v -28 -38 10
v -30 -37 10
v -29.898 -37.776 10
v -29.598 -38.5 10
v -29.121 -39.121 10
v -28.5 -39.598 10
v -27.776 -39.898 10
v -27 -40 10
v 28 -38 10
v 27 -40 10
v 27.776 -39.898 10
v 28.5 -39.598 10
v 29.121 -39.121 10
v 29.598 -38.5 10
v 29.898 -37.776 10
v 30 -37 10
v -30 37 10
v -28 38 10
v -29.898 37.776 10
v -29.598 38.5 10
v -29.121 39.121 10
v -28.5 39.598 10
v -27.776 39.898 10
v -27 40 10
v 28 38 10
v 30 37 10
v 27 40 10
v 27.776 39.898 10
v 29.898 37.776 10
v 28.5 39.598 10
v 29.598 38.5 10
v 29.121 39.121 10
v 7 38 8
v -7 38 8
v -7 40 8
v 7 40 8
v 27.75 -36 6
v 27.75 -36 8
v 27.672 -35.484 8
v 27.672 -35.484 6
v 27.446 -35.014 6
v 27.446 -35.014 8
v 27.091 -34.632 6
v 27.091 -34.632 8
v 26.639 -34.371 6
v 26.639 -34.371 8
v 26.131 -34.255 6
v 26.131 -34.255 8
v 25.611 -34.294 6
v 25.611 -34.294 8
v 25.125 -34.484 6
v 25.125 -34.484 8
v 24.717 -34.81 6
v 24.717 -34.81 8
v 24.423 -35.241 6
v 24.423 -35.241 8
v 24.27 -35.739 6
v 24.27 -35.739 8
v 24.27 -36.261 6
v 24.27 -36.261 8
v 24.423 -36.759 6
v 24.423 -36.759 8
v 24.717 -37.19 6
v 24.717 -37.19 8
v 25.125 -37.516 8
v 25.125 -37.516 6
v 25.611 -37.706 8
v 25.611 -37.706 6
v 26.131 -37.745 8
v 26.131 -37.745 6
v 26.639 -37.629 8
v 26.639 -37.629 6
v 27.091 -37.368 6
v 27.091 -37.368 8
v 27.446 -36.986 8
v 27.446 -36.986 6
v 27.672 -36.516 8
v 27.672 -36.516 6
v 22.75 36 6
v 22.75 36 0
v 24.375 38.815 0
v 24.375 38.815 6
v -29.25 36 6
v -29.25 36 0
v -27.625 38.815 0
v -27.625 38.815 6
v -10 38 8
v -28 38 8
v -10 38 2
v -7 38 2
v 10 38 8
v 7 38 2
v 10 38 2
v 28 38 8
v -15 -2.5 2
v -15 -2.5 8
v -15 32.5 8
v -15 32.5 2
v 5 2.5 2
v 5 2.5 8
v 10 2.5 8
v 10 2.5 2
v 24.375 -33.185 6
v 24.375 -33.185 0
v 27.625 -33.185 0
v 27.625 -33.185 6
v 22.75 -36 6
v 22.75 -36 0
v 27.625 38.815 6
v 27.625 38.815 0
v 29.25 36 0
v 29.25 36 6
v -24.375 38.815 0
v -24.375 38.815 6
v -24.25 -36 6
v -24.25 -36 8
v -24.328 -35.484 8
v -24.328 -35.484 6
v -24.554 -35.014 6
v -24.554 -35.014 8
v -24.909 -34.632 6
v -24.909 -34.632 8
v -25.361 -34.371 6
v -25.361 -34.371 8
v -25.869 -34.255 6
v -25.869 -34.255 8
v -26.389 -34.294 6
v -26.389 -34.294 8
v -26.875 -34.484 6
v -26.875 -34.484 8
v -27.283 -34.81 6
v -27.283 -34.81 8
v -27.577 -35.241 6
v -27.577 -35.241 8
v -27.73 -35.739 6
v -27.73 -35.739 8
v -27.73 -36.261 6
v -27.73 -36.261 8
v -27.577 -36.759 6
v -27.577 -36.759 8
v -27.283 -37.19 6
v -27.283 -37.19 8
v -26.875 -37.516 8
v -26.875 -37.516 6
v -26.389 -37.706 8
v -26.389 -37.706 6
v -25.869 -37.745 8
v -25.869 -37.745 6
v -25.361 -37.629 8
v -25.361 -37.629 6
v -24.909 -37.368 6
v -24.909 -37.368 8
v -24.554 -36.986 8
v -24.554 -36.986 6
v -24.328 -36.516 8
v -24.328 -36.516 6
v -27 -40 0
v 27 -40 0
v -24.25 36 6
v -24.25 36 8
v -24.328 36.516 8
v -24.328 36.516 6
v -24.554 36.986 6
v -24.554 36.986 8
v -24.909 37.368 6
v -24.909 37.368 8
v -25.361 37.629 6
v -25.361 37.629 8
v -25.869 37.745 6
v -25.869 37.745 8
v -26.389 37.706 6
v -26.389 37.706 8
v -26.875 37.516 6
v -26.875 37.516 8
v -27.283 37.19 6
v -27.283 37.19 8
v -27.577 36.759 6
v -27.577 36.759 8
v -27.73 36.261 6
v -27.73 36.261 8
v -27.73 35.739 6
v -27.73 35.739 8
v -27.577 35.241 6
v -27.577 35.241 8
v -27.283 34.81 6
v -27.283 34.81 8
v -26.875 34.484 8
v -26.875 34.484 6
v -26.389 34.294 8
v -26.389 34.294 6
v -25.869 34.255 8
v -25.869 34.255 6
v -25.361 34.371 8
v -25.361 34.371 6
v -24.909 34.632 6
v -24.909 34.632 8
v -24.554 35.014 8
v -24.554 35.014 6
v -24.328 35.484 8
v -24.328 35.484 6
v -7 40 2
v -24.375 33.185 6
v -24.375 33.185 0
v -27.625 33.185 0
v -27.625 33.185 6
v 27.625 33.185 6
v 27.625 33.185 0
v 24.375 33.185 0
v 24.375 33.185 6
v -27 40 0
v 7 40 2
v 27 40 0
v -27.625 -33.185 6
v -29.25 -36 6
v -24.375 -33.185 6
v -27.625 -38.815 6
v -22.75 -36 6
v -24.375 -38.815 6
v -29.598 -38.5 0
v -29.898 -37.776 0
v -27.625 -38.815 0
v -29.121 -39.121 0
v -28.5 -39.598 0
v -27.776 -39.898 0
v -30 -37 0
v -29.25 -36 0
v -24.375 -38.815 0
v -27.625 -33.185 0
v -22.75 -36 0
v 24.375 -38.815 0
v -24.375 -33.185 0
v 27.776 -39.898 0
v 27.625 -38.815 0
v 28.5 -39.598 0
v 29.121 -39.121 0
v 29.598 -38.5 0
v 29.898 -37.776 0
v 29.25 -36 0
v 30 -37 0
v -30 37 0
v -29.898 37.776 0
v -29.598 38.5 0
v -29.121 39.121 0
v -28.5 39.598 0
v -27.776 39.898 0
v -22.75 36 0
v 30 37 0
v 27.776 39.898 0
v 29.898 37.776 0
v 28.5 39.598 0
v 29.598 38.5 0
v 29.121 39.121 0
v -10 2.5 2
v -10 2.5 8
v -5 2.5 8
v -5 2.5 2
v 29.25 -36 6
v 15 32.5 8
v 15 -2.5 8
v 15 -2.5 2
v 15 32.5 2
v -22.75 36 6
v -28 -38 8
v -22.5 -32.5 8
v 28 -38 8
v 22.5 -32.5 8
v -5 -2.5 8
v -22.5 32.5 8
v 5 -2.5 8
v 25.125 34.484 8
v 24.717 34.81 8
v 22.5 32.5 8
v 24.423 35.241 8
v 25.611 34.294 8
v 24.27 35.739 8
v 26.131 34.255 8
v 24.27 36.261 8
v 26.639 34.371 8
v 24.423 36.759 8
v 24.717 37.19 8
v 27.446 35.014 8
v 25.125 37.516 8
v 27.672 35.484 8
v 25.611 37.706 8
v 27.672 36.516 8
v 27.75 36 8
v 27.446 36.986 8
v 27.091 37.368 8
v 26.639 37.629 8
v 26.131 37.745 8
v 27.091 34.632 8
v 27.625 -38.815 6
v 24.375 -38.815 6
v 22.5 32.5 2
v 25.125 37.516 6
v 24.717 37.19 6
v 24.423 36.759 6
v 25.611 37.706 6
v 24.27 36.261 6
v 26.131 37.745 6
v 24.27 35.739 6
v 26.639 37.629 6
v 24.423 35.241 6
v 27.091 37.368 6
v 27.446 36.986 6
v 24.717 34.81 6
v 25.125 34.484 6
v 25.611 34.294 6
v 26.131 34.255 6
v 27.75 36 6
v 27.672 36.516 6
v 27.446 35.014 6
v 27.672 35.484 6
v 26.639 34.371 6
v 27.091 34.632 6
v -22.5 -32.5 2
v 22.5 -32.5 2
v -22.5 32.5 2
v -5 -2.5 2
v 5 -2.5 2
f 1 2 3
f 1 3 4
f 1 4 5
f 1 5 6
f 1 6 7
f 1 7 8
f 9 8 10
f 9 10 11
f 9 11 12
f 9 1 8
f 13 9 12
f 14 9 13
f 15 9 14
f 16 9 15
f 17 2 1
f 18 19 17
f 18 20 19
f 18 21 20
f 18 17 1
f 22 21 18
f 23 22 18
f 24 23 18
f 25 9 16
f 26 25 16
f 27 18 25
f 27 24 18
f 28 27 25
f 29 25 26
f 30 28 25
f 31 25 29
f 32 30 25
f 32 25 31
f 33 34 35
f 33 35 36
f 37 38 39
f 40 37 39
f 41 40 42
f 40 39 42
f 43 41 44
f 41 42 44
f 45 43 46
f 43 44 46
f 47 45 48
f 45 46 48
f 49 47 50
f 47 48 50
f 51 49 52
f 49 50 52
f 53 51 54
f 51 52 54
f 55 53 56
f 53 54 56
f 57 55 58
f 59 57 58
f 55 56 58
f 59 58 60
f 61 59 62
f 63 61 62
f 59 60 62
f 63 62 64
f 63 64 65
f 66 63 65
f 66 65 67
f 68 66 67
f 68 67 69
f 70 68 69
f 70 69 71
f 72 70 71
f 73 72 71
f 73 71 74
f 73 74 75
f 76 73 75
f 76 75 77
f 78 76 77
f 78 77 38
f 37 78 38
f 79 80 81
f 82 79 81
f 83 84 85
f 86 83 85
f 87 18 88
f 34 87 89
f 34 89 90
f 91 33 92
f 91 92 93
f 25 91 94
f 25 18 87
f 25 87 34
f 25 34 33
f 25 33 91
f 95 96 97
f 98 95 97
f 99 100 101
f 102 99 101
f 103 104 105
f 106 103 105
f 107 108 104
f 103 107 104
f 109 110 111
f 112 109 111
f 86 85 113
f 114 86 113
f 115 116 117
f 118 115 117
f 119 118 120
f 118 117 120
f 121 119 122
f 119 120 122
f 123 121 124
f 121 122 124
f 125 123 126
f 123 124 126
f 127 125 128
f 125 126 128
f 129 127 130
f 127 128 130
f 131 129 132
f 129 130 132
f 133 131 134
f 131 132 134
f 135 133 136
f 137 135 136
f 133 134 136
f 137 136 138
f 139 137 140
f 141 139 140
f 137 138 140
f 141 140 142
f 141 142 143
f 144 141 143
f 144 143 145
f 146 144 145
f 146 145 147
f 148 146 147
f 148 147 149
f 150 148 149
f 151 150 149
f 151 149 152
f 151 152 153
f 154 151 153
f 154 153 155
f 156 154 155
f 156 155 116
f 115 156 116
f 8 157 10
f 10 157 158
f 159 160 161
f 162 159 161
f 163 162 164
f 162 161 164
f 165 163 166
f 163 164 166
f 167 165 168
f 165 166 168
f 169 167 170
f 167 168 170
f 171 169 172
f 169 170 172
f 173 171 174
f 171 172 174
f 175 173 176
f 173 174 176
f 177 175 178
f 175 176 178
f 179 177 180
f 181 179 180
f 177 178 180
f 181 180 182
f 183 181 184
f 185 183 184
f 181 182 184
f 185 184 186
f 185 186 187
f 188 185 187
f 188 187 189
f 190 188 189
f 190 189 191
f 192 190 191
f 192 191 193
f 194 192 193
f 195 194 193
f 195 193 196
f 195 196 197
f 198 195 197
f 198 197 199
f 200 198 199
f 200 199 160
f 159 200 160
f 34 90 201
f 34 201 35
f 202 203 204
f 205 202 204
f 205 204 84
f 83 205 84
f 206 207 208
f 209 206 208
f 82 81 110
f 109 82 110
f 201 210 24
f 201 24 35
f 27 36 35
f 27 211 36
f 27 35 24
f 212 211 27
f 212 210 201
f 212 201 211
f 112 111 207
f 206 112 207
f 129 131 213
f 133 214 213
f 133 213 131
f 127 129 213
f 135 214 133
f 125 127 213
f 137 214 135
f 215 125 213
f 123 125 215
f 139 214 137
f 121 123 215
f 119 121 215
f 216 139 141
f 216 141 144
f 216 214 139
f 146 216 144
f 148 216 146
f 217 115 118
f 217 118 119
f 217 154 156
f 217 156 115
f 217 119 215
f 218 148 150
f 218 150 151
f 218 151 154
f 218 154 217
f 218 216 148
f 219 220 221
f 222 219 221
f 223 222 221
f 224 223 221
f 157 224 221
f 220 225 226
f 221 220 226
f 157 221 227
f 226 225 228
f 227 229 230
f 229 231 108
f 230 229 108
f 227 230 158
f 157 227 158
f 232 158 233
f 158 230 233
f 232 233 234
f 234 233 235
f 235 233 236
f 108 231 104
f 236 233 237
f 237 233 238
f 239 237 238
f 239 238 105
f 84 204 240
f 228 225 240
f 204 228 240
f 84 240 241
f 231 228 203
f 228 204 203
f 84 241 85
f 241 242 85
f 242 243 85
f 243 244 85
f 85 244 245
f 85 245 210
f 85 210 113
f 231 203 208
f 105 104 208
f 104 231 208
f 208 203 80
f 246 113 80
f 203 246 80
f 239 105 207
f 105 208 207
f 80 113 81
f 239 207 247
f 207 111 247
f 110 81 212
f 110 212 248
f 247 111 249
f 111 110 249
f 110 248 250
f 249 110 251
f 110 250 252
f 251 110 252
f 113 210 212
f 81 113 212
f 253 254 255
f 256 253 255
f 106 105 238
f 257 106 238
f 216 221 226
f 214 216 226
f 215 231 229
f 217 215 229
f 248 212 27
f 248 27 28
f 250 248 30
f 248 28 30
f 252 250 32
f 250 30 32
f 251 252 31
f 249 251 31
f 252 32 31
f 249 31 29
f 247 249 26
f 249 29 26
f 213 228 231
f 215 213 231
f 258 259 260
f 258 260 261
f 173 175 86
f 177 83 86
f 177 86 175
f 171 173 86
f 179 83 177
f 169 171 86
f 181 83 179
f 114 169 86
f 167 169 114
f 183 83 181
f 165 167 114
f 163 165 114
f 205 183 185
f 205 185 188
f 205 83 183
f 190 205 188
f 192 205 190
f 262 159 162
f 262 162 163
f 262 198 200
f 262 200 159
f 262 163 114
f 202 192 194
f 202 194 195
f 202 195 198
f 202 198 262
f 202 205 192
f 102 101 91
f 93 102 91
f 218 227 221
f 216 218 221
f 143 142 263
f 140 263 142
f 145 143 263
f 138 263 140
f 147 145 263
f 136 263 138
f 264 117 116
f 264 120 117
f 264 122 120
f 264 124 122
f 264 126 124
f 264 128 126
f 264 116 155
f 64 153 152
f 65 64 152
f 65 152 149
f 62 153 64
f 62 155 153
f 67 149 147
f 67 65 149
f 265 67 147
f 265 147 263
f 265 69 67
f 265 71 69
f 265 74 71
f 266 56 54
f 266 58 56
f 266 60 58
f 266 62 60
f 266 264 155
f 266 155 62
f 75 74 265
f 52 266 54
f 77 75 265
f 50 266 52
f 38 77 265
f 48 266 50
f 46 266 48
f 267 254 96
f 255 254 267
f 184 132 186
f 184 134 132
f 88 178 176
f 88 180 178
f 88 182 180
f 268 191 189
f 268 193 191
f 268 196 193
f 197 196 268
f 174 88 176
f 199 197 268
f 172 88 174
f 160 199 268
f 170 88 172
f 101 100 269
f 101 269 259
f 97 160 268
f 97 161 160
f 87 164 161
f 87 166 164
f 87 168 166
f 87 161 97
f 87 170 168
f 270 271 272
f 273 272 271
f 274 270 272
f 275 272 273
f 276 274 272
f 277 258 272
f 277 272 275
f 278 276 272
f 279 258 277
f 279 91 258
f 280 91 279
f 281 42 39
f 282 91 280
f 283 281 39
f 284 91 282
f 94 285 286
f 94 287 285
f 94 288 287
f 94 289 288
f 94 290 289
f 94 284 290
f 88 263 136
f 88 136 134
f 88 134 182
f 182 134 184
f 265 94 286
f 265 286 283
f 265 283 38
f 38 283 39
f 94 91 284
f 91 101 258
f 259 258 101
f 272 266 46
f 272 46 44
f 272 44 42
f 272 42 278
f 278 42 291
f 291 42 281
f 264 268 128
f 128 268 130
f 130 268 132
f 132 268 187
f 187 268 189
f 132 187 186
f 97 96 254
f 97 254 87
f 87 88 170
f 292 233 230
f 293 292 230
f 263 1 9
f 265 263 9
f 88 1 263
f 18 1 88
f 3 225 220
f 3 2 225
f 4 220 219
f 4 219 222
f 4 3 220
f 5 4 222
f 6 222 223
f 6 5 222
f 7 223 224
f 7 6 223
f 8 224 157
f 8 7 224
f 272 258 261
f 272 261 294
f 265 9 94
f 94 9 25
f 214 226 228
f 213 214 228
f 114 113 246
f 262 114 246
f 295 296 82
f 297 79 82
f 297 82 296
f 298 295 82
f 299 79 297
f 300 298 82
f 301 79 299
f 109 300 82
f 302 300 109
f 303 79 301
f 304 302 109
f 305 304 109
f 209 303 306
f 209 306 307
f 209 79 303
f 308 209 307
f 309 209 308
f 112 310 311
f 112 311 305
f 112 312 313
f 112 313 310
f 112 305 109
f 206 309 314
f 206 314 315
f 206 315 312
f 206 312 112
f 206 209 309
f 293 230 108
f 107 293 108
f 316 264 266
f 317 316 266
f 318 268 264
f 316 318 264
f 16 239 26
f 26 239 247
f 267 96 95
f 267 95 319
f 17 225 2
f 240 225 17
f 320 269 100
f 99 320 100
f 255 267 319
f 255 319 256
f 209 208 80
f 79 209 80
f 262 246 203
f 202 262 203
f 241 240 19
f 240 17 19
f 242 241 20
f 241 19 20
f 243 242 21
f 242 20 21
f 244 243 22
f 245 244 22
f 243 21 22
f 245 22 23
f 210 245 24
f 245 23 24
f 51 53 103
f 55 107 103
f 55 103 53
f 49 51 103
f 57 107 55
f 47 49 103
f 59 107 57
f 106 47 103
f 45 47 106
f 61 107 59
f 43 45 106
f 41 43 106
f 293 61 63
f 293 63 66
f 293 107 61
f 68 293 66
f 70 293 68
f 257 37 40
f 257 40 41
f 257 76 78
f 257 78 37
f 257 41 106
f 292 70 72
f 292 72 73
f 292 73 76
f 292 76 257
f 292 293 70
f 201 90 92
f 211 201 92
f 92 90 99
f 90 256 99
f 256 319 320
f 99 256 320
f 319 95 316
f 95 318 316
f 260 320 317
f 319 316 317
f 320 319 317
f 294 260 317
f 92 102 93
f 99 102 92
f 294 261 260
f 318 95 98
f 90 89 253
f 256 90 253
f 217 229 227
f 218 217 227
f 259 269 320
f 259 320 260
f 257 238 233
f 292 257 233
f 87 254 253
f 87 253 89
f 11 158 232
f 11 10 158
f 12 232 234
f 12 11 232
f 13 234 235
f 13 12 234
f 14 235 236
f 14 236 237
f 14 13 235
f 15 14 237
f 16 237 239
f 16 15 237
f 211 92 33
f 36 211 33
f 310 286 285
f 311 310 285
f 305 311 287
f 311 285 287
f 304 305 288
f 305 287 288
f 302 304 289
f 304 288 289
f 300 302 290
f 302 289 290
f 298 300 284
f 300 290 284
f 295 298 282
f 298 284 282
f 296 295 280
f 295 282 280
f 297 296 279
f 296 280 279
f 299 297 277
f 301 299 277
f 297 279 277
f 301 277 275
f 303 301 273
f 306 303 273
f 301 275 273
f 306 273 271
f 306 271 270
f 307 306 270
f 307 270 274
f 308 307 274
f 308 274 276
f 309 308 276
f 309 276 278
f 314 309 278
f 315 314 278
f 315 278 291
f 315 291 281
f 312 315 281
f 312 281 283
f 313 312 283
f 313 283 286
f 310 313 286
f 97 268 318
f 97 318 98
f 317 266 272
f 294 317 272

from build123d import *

# Parameters (mm, degrees)
SKETCH_W        = 60
SKETCH_H        = 80
PAD_DEPTH       = 10
SKETCH001_W     = 56
SKETCH001_H     = 76
POCKET_DEPTH    = 2
SKETCH002_W     = 20
SKETCH002_H     = 35.5
SKETCH002_W_2   = 45
SKETCH002_H_2   = 30
SKETCH002_W_3   = 7.5
SKETCH002_H_3   = 35
POCKET001_DEPTH = 6
SKETCH003_W     = 14
SKETCH003_H     = 6
POCKET002_DEPTH = 5
FILLET_R        = 3
SKETCH004_R     = 1.75
POCKET003_DEPTH = 10
POCKET004_DEPTH = 6
SKETCH013_W     = 10
SKETCH013_H     = 10
POCKET011_DEPTH = 6


with BuildPart() as part:
    # Sketch → Pad (new body)
    with BuildSketch(Plane.XY):
        Rectangle(SKETCH_W, SKETCH_H)
    extrude(amount=PAD_DEPTH)

    # Sketch001 (on Face6 of Pad) → Pocket (cut)
    with BuildSketch(Plane.XY.offset(10)):
        Rectangle(SKETCH001_W, SKETCH001_H)
    extrude(amount=-POCKET_DEPTH, mode=Mode.SUBTRACT)

    # Sketch002 (on Face11 of Pocket) → Pocket001 (cut)
    with BuildSketch(Plane.XY.offset(8)):
        with Locations((0, 20.25)):
            Rectangle(SKETCH002_W, SKETCH002_H)
        with Locations((0, -17.5)):
            Rectangle(SKETCH002_W_2, SKETCH002_H_2)
        with Locations((-18.75, 15)):
            Rectangle(SKETCH002_W_3, SKETCH002_H_3)
        with Locations((18.75, 15)):
            Rectangle(SKETCH002_W_3, SKETCH002_H_3)
    extrude(amount=-POCKET001_DEPTH, mode=Mode.SUBTRACT)

    # Sketch003 (on Face24 of Pocket001) → Pocket002 (cut)
    with BuildSketch(Plane.XZ.offset(-38)):
        with Locations((0, 5)):
            Rectangle(SKETCH003_W, SKETCH003_H)
    extrude(amount=-POCKET002_DEPTH, mode=Mode.SUBTRACT)

    # Fillet
    fillet_edges = [part.edges().sort_by_distance(p)[0] for p in [
        (-30, -40, 5),
        (-30, 40, 5),
        (30, -40, 5),
        (30, 40, 5),
    ]]
    fillet(fillet_edges, radius=FILLET_R)

    # Sketch004 (on Face19 of Fillet) → Pocket003 (cut)
    with BuildSketch(Plane.XY.offset(8)):
        with Locations((26, -36)):
            Circle(SKETCH004_R)
        with Locations((-26, -36)):
            Circle(SKETCH004_R)
        with Locations((-26, 36)):
            Circle(SKETCH004_R)
        with Locations((26, 36)):
            Circle(SKETCH004_R)
    extrude(amount=-POCKET003_DEPTH, mode=Mode.SUBTRACT)

    # Sketch005 (on Face2 of Pocket003) → Pocket004 (cut)
    with BuildSketch(Plane(origin=(0, 0, 0), x_dir=(1, 0, 0), z_dir=(0, 0, -1))):
        Polygon((-24.375, 33.185417), (-22.75, 36), (-24.375, 38.814583), (-27.625, 38.814583), (-29.25, 36), (-27.625, 33.185417), align=None)
        Polygon((27.625, 33.185417), (29.25, 36), (27.625, 38.814583), (24.375, 38.814583), (22.75, 36), (24.375, 33.185417), align=None)
        Polygon((-22.75, -36), (-24.375, -33.185417), (-27.625, -33.185417), (-29.25, -36), (-27.625, -38.814583), (-24.375, -38.814583), align=None)
        Polygon((29.25, -36), (27.625, -33.185417), (24.375, -33.185417), (22.75, -36), (24.375, -38.814583), (27.625, -38.814583), align=None)
    extrude(amount=-POCKET004_DEPTH, mode=Mode.SUBTRACT)

    # Sketch013 (on Face47 of Pocket004) → Pocket011 (cut)
    with BuildSketch(Plane.XY.offset(8)):
        Rectangle(SKETCH013_W, SKETCH013_H)
    extrude(amount=-POCKET011_DEPTH, mode=Mode.SUBTRACT)


solid = part.part
